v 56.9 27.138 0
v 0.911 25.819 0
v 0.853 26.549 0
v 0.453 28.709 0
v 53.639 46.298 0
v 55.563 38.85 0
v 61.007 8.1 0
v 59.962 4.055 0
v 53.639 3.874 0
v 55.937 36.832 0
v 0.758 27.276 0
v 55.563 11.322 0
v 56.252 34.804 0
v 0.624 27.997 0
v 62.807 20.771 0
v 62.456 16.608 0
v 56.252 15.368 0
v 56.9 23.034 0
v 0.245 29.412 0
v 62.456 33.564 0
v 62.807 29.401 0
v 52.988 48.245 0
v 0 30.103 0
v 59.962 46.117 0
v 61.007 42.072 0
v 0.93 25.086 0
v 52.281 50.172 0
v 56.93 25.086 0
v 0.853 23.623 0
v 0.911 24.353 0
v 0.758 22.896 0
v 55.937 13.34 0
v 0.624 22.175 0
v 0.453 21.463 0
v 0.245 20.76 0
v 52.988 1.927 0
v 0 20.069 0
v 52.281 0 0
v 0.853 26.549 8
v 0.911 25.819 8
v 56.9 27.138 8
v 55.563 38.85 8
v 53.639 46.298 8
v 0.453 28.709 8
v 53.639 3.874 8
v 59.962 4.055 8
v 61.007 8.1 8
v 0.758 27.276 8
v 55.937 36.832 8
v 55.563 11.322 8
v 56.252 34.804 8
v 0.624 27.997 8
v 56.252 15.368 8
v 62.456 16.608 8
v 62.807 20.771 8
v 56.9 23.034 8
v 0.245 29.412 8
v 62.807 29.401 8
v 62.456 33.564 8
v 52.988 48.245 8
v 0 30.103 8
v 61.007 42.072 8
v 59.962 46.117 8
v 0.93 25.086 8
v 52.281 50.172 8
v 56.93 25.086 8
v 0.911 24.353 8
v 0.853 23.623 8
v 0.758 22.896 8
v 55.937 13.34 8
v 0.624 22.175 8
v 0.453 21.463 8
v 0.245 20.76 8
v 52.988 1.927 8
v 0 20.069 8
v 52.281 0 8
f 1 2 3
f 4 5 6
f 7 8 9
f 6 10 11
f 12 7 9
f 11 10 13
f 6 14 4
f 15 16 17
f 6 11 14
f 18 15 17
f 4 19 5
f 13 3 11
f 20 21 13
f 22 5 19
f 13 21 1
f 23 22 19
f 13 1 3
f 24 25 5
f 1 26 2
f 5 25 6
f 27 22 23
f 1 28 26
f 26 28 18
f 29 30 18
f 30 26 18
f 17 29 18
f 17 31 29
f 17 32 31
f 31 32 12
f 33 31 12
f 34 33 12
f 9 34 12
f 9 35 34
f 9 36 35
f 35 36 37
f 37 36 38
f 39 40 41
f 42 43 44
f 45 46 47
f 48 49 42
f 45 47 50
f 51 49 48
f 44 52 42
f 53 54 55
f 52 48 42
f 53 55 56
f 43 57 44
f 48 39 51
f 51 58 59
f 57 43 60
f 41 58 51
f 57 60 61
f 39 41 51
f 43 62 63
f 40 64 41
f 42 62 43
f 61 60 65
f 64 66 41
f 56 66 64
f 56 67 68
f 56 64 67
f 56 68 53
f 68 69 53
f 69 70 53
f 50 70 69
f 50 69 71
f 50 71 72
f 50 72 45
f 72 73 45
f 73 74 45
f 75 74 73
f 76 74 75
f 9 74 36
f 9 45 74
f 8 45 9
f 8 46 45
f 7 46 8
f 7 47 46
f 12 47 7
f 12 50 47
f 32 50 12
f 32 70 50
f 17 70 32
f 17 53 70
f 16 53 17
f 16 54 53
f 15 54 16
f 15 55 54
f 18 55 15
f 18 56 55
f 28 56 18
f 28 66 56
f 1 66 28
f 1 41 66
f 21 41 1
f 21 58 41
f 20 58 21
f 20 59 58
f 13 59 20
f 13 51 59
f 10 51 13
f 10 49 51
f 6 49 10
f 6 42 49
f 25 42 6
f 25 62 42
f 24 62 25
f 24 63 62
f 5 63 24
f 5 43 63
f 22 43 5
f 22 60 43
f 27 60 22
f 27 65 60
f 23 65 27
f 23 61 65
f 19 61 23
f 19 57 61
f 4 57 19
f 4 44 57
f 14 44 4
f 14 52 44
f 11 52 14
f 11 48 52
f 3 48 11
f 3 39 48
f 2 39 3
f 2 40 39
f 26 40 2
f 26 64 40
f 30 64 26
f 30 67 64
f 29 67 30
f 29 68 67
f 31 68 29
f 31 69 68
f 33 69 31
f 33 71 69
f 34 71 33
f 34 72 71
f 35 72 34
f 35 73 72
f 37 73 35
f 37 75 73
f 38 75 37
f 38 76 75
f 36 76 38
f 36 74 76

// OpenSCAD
$fn = 32;

// ----------------------------------------------------------------------
// Gear sector: 4 teeth on 42 degrees
// ----------------------------------------------------------------------

// --- parameters (mm) ---
sector_angle = 42;        // sector angle, degrees
root_r = 70;              // root circle radius
tooth_h = 6;              // tooth height over the root circle
teeth = 4;                // number of teeth on the sector
hub_r = 14;               // hub bore radius
plate_t = 8;              // sector thickness, Z
arc_step = 3;             // sampling step of the root/hub arcs, degrees

tip_r = root_r + tooth_h;  // tip circle radius

profile = [[52.281, 0], [52.988, 1.927], [53.639, 3.874], [59.962, 4.055], [61.007, 8.1], [55.563, 11.322], [55.937, 13.34], [56.252, 15.368], [62.456, 16.608], [62.807, 20.771], [56.9, 23.034], [56.93, 25.086], [56.9, 27.138], [62.807, 29.401], [62.456, 33.564], [56.252, 34.804], [55.937, 36.832], [55.563, 38.85], [61.007, 42.072], [59.962, 46.117], [53.639, 46.298], [52.988, 48.245], [52.281, 50.172], [0, 30.103], [0.245, 29.412], [0.453, 28.709], [0.624, 27.997], [0.758, 27.276], [0.853, 26.549], [0.911, 25.819], [0.93, 25.086], [0.911, 24.353], [0.853, 23.623], [0.758, 22.896], [0.624, 22.175], [0.453, 21.463], [0.245, 20.76], [0, 20.069]];  // primary outline, 38 points, counter clockwise

// --- the one profile operation ---
linear_extrude(height = plate_t) polygon(points = profile);
